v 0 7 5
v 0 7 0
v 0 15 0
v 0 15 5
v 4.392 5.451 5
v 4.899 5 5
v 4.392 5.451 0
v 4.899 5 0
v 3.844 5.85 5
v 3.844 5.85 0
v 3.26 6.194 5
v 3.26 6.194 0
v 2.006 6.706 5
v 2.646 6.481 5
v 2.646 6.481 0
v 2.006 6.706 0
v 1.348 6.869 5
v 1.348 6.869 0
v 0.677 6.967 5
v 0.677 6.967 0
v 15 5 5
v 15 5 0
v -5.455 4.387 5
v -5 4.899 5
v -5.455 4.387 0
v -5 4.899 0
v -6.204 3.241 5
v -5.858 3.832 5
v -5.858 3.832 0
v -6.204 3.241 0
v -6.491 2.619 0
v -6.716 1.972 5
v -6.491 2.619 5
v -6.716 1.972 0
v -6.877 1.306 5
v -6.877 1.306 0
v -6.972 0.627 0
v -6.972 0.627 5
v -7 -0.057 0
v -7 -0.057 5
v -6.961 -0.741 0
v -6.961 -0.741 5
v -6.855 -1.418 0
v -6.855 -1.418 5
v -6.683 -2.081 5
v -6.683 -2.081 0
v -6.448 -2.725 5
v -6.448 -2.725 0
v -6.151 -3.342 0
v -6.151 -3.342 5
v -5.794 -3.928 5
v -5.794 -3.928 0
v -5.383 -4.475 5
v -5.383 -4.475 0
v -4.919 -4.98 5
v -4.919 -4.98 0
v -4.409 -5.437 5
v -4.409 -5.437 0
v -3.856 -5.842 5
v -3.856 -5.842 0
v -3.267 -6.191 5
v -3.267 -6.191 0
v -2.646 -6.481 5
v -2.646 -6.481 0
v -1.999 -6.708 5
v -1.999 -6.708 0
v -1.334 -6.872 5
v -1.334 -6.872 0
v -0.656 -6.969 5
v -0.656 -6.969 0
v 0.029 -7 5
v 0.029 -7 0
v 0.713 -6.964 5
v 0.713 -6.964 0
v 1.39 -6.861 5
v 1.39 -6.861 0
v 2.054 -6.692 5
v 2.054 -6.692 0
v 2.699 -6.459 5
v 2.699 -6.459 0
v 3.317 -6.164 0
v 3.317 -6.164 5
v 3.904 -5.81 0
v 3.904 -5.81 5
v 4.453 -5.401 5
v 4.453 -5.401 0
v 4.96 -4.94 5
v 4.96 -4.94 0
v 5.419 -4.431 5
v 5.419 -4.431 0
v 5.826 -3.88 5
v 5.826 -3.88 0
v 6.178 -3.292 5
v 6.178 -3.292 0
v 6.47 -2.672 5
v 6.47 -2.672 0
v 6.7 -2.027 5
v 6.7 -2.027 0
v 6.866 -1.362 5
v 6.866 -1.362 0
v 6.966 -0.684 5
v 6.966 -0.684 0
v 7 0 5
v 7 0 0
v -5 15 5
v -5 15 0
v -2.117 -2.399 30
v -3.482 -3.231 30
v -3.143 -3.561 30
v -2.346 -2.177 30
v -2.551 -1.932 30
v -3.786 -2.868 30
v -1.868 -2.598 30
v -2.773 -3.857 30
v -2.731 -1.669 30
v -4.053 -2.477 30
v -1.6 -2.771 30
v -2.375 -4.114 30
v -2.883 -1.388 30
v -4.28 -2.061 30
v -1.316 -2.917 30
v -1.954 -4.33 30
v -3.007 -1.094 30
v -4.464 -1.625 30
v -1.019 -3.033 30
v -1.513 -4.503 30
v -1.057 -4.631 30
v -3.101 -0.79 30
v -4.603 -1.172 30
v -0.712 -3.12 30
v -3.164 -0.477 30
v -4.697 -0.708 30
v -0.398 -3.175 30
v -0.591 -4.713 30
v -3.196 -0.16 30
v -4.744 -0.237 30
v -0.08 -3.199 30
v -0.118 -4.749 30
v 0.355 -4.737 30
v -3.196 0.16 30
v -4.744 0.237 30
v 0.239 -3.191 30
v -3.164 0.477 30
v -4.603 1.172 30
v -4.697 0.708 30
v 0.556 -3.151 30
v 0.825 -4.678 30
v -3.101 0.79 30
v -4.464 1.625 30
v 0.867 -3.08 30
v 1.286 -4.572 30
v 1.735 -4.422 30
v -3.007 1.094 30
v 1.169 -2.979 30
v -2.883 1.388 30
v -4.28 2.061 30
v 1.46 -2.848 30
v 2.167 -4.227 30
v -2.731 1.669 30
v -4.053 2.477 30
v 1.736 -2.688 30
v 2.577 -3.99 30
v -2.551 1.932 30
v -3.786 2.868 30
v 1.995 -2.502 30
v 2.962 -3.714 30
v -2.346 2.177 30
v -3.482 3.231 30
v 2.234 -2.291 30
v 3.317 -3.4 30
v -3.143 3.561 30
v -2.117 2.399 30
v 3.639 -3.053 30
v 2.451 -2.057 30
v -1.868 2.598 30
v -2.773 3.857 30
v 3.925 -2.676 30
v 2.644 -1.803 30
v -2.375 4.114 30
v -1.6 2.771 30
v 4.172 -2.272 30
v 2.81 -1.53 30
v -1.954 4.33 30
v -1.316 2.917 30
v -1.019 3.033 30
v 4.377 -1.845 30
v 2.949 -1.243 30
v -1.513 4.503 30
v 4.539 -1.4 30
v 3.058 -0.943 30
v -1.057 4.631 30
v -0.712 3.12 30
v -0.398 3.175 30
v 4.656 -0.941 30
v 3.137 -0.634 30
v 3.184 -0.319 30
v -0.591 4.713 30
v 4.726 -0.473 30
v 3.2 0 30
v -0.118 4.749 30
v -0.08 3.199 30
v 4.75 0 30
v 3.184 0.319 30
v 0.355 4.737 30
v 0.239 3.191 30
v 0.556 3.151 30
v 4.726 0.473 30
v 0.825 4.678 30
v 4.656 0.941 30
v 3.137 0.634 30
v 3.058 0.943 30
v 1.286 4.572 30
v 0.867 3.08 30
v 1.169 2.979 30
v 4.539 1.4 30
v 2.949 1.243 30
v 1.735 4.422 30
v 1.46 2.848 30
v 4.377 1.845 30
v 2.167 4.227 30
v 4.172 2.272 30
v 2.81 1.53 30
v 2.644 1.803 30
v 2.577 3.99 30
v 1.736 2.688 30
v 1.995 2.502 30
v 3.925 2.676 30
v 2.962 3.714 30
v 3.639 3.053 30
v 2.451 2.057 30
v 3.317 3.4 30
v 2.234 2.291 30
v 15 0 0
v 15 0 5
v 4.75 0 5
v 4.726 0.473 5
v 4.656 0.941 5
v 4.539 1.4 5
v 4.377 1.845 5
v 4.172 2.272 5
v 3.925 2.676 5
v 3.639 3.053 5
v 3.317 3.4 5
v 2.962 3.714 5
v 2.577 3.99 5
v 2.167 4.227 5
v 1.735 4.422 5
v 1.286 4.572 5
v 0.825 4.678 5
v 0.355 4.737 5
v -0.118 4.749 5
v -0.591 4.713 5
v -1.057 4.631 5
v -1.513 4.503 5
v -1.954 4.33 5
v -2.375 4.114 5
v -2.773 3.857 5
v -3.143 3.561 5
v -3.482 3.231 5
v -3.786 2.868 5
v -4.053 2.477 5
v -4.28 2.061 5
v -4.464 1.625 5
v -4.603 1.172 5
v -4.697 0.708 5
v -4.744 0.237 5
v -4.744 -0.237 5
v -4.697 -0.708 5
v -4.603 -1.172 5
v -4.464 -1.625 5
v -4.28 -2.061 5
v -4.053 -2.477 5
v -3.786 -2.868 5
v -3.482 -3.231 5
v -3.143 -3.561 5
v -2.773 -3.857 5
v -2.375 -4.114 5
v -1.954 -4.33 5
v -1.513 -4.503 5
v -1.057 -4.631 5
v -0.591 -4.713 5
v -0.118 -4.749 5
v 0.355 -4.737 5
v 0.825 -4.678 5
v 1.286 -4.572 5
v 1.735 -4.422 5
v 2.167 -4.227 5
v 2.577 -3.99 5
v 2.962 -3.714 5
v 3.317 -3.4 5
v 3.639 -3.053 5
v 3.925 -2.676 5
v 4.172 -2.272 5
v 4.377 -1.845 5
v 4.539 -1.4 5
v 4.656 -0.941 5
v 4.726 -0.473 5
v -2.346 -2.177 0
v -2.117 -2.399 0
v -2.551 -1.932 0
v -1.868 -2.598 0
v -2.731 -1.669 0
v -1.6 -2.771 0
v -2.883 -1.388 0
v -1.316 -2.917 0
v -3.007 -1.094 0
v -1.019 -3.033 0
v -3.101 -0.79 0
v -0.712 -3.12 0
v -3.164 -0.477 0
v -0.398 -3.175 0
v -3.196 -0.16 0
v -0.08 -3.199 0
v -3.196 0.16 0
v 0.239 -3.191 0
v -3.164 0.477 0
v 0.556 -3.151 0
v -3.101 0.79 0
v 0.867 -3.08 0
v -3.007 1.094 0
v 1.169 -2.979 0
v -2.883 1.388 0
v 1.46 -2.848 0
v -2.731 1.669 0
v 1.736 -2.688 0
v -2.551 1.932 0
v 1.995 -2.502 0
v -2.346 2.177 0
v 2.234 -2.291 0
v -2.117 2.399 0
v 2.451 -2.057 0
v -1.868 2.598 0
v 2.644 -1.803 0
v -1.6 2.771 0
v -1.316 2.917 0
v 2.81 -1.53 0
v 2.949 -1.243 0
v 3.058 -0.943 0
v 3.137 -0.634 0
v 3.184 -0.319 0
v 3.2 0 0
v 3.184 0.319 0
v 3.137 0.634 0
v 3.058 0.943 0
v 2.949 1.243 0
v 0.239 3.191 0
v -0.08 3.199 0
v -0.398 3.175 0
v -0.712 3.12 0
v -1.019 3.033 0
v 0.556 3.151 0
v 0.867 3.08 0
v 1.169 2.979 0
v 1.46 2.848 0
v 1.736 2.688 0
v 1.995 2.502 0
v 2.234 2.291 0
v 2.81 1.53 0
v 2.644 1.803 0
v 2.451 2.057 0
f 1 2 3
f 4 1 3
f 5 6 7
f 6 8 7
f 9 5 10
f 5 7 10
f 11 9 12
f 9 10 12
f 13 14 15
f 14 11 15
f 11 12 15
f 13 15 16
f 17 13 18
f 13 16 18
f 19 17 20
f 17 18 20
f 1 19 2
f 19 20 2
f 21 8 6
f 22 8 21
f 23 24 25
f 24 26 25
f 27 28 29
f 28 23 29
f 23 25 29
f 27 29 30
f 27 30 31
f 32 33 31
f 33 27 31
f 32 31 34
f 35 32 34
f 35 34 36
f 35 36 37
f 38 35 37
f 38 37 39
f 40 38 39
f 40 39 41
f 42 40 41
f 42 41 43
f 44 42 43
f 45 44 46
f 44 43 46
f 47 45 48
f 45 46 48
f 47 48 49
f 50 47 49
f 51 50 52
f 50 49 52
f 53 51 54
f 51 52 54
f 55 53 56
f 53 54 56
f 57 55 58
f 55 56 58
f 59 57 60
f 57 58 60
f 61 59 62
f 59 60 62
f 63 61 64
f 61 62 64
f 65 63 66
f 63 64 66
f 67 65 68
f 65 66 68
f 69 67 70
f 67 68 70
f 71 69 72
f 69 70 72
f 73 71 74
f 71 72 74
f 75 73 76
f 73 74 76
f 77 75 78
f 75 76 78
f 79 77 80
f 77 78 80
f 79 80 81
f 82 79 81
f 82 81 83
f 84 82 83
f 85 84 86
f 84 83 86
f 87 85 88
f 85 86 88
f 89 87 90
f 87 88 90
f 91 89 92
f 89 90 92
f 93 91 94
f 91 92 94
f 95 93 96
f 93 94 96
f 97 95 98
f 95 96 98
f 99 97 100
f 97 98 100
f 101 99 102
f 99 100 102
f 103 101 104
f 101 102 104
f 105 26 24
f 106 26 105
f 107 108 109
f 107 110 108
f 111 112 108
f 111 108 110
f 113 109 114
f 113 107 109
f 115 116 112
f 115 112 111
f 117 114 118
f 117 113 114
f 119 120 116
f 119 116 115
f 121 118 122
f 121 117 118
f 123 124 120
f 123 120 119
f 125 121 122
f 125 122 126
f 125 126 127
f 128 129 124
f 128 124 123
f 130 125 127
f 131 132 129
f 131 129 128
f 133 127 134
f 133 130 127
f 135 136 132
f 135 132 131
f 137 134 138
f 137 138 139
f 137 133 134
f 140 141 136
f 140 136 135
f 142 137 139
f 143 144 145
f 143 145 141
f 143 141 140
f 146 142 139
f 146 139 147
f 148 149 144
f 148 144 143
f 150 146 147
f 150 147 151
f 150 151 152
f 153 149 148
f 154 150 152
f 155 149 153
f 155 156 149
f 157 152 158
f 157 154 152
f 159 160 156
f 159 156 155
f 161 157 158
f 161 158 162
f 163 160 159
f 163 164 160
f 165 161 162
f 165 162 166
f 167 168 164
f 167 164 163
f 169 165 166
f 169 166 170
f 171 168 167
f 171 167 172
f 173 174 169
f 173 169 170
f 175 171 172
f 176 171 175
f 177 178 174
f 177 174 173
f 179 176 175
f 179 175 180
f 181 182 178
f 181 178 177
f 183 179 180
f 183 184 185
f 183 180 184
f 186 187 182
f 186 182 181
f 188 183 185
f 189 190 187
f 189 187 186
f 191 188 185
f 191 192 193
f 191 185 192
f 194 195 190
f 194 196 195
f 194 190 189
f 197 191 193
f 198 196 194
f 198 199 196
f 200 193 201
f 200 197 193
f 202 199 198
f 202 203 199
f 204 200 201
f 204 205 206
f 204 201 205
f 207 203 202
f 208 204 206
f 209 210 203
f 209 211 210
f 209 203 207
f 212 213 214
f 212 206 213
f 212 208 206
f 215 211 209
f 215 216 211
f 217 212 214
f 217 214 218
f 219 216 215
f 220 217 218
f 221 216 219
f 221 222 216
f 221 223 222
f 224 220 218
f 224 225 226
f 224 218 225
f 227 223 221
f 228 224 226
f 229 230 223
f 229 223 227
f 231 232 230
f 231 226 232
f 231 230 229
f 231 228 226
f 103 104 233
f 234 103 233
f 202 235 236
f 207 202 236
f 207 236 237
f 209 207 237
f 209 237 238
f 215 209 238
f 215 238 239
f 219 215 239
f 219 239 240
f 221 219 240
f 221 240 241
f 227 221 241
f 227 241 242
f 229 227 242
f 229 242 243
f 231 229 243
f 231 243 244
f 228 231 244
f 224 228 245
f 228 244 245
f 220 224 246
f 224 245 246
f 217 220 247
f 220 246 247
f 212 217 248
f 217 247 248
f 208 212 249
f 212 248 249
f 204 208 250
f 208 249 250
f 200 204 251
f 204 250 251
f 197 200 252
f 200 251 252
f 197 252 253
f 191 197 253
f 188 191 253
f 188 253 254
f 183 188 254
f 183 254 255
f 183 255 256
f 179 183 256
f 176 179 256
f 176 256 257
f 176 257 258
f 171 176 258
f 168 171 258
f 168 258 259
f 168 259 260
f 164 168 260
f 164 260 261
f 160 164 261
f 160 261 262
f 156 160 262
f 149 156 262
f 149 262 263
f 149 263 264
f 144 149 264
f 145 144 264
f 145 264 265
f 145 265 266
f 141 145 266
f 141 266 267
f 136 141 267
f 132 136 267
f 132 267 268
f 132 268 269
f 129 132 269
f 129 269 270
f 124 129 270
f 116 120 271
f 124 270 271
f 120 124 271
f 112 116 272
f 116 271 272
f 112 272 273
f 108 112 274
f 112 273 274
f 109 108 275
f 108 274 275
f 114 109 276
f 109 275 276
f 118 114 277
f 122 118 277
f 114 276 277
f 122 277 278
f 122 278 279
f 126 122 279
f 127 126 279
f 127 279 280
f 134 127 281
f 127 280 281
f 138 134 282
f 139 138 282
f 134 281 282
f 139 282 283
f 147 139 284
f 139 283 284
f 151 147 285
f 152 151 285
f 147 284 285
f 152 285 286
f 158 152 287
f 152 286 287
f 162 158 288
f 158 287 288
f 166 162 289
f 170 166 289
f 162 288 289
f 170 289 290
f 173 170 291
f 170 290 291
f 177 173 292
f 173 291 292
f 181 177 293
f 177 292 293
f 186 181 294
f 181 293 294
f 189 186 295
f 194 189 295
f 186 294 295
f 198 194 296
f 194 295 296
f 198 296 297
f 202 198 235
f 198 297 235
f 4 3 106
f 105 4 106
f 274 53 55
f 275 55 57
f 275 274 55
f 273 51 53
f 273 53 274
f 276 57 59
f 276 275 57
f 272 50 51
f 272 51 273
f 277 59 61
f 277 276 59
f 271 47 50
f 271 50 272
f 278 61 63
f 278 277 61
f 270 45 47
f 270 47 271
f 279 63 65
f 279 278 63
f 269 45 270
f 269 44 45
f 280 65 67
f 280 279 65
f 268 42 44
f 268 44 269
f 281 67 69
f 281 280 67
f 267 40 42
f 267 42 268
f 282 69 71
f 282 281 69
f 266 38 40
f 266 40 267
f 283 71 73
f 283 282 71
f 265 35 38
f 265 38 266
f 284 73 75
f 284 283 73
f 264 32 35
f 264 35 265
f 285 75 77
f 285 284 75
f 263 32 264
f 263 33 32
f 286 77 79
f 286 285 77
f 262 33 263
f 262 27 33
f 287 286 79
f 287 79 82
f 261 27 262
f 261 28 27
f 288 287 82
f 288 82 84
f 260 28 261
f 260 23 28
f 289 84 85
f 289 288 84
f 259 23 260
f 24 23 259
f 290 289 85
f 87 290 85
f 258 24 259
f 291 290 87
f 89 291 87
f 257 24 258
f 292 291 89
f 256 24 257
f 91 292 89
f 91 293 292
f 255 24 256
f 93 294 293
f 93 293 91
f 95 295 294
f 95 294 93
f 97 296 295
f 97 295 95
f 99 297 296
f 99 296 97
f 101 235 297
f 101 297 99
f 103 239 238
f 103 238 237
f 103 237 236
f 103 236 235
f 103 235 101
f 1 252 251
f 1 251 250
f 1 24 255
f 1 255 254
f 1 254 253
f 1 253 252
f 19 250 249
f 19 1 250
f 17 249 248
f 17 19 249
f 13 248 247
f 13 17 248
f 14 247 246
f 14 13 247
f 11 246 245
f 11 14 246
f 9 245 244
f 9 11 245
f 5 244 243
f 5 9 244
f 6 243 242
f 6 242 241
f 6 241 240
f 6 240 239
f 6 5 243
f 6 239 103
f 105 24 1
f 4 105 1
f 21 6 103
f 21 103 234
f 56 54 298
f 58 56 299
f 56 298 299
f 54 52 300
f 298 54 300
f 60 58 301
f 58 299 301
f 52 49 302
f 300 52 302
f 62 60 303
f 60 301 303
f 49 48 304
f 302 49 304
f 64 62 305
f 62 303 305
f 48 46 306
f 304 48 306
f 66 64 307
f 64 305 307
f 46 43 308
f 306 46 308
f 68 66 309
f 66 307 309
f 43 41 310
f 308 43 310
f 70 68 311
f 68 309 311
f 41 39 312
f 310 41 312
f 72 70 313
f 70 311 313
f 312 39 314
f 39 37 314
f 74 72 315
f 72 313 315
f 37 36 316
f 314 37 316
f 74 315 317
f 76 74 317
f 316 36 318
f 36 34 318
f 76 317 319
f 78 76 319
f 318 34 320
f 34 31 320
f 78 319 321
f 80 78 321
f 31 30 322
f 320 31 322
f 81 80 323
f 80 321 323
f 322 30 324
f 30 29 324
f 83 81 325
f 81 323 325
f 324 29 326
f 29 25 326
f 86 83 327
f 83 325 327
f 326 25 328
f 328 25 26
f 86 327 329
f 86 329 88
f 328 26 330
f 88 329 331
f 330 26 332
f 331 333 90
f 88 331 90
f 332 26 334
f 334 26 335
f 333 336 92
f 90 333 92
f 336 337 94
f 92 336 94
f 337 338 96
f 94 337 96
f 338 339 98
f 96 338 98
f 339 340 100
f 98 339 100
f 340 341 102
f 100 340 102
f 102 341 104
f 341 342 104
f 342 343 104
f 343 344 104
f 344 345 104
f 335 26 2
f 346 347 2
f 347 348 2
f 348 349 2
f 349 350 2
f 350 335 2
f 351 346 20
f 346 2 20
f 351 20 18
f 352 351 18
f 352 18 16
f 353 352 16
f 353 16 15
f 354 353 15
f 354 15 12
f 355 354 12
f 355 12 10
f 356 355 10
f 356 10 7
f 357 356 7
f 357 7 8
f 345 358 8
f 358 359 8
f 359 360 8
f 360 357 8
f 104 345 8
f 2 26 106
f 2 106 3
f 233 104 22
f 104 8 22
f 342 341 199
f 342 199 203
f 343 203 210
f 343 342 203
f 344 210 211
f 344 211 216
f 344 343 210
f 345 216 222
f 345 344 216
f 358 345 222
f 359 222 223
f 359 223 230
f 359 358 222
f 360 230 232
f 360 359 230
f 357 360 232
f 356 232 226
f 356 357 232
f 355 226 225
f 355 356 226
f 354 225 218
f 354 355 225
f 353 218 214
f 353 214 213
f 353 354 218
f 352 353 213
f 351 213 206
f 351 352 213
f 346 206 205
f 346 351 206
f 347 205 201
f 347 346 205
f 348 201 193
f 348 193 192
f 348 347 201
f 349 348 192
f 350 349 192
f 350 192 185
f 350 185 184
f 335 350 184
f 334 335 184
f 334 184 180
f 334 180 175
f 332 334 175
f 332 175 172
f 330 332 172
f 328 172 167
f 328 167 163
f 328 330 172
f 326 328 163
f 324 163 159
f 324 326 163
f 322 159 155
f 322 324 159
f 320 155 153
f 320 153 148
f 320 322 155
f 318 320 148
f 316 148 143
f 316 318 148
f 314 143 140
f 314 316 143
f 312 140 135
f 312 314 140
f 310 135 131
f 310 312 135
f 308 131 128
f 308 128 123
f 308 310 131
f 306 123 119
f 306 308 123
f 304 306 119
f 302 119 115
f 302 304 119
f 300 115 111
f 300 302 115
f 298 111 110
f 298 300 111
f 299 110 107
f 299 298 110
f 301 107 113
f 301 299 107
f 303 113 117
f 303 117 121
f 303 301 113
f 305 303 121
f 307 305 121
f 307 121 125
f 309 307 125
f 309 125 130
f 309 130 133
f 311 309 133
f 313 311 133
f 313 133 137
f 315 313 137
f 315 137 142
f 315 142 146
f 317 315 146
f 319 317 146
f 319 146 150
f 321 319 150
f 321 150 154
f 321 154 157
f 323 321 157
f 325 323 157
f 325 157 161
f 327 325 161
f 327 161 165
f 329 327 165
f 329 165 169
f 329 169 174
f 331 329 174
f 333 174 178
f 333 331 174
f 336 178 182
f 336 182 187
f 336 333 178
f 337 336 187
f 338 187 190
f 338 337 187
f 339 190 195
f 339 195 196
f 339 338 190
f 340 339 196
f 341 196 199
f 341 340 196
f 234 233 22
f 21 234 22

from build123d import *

# Parameters (mm, degrees)
CYLINDER_R             = 3.2
CYLINDER_DEPTH         = 30
BOX001_W               = 15
BOX001_H               = 5
BOX001_DEPTH           = 5
BOX001_PLACEMENT_ANGLE = 90
BOX_W                  = 15
BOX_H                  = 5
BOX_DEPTH              = 5
CYLINDER001_R          = 4.75
CYLINDER001_DEPTH      = 30
CYLINDER002_R          = 7
CYLINDER002_DEPTH      = 5


with BuildPart() as cylinder:
    # Cylinder → Cylinder (new body)
    with BuildSketch(Plane.XY):
        Circle(CYLINDER_R)
    extrude(amount=CYLINDER_DEPTH)


with BuildPart() as box001:
    # Box001 → Box001 (new body)
    with BuildSketch(Plane.XY):
        with Locations((7.5, 2.5)):
            Rectangle(BOX001_W, BOX001_H)
    extrude(amount=BOX001_DEPTH)


with BuildPart() as box001_1:
    # Box001 placement: moved
    add(box001.part.rotate(Axis((0, 0, 0), (0, 0, 1)), BOX001_PLACEMENT_ANGLE))


with BuildPart() as box:
    # Box → Box (new body)
    with BuildSketch(Plane.XY):
        with Locations((7.5, 2.5)):
            Rectangle(BOX_W, BOX_H)
    extrude(amount=BOX_DEPTH)


with BuildPart() as cylinder001:
    # Cylinder001 → Cylinder001 (new body)
    with BuildSketch(Plane.XY):
        Circle(CYLINDER001_R)
    extrude(amount=CYLINDER001_DEPTH)


with BuildPart() as cut:
    # Cylinder002 → Cylinder002 (new body)
    with BuildSketch(Plane.XY):
        Circle(CYLINDER002_R)
    extrude(amount=CYLINDER002_DEPTH)

    # Fusion: union Cylinder001
    add(cylinder001.part)

    # Fusion001: union Box001, Box
    add(box001_1.part)
    add(box.part)

    # Cut: cut Cylinder
    add(cylinder.part, mode=Mode.SUBTRACT)


solid = cut.part
